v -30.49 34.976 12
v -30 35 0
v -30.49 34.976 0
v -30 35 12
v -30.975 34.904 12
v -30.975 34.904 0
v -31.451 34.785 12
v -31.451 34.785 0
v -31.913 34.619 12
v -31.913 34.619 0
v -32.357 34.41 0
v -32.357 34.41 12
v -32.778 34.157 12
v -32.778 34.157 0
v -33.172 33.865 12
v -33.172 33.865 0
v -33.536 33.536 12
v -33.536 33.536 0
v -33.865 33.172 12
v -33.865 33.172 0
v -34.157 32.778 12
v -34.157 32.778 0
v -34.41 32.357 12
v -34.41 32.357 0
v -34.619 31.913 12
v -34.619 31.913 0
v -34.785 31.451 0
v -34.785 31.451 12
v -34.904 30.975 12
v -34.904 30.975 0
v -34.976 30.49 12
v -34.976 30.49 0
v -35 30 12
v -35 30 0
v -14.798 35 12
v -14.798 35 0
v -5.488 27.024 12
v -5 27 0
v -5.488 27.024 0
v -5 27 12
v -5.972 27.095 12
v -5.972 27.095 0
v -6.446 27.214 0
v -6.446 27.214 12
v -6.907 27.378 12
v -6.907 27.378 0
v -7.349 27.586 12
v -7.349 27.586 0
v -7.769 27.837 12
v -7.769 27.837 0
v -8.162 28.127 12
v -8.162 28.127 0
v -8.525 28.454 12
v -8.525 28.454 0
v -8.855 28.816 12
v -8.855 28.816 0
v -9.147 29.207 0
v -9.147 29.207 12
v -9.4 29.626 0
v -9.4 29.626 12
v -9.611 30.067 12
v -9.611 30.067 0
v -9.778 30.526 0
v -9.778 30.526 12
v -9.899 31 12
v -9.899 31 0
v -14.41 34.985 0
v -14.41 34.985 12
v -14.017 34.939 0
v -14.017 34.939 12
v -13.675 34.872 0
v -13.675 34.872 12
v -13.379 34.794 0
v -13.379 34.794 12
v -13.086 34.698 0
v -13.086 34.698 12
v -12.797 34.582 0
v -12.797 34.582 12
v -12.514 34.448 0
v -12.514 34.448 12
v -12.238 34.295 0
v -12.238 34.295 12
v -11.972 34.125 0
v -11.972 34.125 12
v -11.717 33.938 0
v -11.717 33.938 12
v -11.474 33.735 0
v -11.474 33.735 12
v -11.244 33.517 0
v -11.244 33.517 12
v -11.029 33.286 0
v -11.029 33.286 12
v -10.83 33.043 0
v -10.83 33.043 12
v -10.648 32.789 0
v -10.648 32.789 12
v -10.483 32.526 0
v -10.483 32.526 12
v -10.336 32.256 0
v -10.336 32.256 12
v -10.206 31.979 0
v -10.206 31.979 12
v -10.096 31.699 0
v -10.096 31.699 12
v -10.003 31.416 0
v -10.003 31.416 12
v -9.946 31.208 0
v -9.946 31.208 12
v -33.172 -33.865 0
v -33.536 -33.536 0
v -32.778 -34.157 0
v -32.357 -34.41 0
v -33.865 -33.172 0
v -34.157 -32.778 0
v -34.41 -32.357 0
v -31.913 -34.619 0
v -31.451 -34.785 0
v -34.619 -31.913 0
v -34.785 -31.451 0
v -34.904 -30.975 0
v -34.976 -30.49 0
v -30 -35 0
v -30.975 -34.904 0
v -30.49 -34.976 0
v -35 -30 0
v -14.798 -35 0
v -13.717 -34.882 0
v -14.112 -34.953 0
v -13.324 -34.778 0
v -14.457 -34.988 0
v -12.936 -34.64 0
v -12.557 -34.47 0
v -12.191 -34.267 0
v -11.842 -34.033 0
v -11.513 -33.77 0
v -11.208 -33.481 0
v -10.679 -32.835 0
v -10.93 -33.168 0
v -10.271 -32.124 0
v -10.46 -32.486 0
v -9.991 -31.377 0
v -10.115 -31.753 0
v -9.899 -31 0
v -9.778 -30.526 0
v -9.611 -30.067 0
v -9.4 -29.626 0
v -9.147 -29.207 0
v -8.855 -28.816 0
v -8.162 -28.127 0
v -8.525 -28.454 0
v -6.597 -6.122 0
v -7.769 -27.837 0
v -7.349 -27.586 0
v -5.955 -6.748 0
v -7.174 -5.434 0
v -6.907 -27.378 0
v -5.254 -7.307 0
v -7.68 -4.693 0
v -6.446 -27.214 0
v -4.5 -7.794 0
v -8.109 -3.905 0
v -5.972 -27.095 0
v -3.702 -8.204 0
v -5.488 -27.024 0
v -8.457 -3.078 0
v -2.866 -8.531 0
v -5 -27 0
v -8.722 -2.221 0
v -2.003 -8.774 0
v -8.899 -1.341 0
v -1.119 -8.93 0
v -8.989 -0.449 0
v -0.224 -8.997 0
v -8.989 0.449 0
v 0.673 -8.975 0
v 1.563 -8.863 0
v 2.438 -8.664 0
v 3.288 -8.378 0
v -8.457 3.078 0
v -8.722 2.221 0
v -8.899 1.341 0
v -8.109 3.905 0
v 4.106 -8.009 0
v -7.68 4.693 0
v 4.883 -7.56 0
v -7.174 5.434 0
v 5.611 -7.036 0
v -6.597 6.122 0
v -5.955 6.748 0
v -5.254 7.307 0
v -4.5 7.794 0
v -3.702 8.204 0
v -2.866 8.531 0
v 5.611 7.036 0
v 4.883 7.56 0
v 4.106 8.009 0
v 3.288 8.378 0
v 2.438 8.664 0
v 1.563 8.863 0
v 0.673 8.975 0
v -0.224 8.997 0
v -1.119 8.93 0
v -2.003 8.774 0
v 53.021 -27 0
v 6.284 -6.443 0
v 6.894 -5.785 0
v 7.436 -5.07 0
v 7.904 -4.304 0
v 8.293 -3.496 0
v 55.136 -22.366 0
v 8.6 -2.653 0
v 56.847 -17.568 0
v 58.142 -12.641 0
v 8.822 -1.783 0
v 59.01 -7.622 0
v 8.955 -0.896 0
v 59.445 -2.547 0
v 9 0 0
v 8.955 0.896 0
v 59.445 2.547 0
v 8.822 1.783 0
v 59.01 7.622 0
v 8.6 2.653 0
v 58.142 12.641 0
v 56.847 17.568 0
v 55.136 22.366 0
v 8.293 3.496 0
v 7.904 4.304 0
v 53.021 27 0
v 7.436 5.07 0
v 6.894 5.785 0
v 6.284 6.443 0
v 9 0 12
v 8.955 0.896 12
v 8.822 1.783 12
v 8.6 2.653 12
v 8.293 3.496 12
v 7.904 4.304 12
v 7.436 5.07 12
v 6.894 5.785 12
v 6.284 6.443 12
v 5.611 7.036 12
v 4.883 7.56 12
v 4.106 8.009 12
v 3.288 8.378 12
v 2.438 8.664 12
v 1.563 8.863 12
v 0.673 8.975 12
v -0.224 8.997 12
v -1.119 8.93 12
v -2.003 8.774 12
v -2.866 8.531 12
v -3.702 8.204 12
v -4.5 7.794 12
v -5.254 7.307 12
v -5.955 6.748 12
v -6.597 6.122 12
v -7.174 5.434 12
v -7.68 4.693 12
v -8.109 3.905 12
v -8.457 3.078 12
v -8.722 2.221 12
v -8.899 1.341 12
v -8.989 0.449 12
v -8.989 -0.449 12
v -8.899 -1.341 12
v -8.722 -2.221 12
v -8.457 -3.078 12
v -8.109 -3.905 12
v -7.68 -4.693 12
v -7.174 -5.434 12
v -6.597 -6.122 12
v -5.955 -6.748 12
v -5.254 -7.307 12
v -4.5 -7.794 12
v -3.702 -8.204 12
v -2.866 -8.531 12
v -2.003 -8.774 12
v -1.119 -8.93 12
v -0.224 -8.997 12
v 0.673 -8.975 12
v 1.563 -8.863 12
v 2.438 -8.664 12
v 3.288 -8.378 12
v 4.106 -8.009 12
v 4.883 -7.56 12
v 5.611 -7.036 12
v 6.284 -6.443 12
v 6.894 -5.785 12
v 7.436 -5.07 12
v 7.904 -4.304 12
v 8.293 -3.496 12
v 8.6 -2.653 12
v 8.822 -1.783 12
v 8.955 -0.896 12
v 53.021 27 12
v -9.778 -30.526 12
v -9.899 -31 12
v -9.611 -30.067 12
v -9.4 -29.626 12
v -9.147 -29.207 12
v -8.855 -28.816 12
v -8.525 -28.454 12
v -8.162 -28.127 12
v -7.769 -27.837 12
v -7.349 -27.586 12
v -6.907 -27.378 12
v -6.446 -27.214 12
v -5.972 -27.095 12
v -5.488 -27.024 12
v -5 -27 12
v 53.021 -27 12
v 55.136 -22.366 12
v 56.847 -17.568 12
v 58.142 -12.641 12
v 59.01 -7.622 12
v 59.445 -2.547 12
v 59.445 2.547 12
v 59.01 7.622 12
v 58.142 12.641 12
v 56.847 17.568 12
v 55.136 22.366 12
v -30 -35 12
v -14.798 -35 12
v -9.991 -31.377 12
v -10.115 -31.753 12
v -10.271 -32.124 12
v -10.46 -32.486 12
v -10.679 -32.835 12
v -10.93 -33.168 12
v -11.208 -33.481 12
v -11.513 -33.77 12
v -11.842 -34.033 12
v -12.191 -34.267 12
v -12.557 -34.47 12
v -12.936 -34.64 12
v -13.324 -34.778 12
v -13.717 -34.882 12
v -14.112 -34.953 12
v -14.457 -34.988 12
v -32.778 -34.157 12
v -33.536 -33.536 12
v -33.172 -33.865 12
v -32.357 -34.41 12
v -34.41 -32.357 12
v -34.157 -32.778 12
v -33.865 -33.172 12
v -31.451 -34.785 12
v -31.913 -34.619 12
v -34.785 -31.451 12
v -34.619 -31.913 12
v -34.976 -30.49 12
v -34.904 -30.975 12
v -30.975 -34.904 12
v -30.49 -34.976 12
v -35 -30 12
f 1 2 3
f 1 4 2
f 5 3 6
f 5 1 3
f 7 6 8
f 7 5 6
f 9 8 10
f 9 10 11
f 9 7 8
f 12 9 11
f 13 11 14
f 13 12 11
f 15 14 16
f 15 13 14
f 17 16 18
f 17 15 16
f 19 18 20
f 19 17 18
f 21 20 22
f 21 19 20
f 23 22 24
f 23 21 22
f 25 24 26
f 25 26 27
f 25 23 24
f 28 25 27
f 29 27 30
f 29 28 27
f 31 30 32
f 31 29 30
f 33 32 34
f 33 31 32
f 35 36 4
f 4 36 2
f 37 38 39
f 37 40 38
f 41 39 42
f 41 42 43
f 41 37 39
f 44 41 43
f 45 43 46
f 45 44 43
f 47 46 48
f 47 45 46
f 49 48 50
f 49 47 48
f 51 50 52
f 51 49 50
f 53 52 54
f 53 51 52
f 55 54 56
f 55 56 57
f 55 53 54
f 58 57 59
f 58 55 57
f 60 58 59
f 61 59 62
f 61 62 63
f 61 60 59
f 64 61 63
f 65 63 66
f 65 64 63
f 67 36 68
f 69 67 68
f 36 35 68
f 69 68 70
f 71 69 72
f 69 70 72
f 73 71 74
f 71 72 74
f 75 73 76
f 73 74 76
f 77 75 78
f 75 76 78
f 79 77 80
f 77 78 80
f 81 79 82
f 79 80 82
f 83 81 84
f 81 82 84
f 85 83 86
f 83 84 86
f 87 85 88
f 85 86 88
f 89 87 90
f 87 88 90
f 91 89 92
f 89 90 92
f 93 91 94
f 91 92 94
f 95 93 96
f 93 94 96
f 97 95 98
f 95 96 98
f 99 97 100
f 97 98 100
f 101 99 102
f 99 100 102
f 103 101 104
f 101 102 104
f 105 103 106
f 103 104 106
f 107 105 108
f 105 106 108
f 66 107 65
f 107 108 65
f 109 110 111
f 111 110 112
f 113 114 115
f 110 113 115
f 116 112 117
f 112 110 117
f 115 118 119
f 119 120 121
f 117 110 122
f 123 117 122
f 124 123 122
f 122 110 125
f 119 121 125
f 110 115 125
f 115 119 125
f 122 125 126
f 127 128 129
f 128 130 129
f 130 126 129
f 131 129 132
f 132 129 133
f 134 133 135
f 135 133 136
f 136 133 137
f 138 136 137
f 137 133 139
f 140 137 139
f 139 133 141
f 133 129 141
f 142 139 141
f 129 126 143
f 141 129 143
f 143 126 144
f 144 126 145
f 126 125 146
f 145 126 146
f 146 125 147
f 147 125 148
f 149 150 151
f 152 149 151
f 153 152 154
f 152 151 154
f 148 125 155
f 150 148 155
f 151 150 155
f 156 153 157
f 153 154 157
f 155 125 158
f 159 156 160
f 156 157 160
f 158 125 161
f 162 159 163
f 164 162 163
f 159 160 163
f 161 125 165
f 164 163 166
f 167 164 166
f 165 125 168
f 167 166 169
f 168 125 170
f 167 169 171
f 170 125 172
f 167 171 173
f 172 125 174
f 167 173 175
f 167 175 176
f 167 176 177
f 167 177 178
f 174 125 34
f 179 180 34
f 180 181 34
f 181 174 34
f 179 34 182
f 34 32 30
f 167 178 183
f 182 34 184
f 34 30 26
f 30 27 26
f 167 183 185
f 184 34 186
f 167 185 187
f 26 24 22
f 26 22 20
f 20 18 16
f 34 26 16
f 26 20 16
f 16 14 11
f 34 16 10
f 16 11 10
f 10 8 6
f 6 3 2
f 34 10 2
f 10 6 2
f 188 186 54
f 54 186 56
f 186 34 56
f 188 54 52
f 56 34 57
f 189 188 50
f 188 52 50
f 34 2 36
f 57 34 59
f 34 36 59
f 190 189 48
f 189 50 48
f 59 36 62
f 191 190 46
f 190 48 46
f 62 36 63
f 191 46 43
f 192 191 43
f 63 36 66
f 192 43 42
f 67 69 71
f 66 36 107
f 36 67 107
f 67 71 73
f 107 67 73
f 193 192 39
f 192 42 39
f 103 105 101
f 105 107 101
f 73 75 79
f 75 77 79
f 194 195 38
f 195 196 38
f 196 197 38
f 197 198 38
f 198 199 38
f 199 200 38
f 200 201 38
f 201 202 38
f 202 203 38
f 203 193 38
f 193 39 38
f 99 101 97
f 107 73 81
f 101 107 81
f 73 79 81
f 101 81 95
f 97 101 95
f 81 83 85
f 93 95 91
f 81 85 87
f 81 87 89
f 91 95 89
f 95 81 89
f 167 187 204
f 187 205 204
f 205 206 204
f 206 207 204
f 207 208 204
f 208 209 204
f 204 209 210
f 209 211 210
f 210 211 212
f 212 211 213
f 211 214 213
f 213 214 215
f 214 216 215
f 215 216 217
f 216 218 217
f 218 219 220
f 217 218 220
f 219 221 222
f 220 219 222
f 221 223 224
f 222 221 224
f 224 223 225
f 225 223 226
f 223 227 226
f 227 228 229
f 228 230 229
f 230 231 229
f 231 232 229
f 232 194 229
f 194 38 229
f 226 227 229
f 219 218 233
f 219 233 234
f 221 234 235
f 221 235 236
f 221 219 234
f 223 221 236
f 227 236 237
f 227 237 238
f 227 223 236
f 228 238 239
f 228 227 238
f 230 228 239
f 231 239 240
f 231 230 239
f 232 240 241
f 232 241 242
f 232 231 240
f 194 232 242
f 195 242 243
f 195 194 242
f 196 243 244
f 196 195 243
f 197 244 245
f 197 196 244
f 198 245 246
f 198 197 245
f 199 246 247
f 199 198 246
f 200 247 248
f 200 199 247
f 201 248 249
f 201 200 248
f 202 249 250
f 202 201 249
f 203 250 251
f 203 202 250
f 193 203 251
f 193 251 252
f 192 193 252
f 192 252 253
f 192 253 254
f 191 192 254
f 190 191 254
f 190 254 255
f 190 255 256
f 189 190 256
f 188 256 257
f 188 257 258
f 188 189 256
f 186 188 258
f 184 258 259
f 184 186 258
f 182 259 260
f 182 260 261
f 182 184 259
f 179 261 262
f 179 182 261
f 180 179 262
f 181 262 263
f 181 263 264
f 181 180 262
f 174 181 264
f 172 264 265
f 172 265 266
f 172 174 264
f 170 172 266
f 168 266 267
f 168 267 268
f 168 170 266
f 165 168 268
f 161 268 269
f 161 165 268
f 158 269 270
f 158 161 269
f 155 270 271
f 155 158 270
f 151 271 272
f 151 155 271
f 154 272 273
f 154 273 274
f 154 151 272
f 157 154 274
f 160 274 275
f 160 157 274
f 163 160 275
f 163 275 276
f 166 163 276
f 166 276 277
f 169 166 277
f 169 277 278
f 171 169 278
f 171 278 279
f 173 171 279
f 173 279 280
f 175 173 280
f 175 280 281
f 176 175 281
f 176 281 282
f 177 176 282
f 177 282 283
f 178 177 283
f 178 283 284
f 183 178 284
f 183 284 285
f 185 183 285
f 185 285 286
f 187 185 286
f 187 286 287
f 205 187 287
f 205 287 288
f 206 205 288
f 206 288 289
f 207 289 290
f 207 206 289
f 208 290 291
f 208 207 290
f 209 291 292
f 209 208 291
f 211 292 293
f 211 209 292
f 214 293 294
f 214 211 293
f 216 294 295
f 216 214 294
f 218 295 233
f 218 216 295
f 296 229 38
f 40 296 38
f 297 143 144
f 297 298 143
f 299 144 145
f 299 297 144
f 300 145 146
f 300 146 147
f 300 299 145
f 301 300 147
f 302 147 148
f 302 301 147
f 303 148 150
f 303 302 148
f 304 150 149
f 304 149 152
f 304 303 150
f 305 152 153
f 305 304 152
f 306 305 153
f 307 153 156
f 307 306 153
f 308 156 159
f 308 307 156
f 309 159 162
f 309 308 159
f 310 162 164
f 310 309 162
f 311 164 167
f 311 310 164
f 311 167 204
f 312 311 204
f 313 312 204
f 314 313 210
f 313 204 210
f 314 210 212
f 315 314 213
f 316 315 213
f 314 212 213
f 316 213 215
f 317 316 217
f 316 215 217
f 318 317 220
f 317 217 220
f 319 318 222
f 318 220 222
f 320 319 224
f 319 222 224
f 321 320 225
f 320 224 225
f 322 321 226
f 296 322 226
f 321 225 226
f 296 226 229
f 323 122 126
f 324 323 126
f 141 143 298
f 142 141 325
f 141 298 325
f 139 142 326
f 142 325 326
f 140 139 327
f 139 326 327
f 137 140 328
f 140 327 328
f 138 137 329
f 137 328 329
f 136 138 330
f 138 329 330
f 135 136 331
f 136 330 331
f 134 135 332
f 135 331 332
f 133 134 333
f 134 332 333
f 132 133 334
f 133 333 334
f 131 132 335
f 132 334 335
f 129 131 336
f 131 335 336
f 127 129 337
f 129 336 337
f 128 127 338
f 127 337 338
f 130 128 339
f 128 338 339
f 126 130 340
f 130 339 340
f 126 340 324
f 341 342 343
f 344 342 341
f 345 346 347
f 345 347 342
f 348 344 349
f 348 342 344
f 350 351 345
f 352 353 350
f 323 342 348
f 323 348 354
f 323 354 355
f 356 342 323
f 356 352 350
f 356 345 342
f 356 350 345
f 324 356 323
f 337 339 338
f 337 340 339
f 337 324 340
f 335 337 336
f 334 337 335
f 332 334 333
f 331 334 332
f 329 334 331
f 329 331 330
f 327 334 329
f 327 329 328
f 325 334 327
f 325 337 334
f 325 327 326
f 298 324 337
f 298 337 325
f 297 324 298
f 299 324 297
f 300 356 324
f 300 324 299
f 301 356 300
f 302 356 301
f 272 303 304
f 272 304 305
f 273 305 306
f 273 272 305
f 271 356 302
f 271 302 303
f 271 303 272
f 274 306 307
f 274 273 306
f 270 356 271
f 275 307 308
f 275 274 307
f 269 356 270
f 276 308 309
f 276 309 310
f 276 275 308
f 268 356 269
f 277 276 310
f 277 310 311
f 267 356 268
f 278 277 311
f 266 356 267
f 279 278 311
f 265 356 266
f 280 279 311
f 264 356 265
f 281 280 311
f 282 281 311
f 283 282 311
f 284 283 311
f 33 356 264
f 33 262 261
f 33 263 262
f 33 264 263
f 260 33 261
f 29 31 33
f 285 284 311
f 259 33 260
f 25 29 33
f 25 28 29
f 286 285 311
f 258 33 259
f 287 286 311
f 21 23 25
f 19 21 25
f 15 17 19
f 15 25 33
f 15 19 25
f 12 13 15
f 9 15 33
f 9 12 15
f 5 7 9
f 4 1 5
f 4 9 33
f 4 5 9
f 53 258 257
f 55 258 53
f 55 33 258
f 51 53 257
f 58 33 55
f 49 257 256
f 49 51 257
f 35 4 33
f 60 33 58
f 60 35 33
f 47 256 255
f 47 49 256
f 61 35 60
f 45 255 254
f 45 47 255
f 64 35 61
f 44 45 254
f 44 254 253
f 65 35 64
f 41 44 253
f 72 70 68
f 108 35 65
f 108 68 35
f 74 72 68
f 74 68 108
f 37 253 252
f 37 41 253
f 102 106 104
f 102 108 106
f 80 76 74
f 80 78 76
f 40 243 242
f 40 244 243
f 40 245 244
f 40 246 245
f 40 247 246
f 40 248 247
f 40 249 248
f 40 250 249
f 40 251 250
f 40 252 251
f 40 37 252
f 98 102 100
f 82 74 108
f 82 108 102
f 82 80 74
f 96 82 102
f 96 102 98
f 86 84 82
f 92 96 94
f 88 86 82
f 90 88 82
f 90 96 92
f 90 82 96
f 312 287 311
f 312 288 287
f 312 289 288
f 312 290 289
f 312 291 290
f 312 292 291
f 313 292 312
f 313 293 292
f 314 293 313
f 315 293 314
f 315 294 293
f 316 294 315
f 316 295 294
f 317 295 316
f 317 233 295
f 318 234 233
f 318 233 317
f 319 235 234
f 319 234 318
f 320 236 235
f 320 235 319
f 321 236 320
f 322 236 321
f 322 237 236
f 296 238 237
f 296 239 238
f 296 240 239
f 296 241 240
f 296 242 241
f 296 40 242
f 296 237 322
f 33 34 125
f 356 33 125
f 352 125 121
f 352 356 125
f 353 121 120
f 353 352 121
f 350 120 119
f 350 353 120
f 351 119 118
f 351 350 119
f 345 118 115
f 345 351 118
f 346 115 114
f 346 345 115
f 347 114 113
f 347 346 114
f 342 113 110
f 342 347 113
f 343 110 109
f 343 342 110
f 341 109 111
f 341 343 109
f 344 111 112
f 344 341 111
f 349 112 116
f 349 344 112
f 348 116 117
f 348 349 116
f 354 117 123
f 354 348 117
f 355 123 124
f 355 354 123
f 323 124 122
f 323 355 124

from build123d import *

# Parameters (mm, degrees)
F0_R     = 9
F1_DEPTH = 12
F2_R     = 5
F3_R     = 5
F4_R     = 5
F5_R     = 5
F6_R     = 5


with BuildPart() as f1:
    # F0 (on Top) → F1 (new body)
    with BuildSketch(Plane.XY):
        with BuildLine():
            Line((-10, 35), (-35, 35))
            Line((-35, 35), (-35, -35))
            Line((-35, -35), (-10, -35))
            Line((-10, -35), (-10, -27))
            Line((-10, -27), (53.02122, -27))
            ThreePointArc((53.02122, -27), (59.499998, 0), (53.02122, 27))
            Line((53.02122, 27), (-10, 27))
            Line((-10, 27), (-10, 35))
        make_face()
        Circle(F0_R, mode=Mode.SUBTRACT)
    extrude(amount=F1_DEPTH)

    # F2
    f2_edges = [f1.edges().sort_by_distance(p)[0] for p in [
        (-10, -27, 6),
    ]]
    fillet(f2_edges, radius=F2_R)

    # F3
    f3_edges = [f1.edges().sort_by_distance(p)[0] for p in [
        (-10, 27, 6),
    ]]
    fillet(f3_edges, radius=F3_R)

    # F4
    f4_edges = [f1.edges().sort_by_distance(p)[0] for p in [
        (-10, -35, 6),
    ]]
    fillet(f4_edges, radius=F4_R)

    # F5
    f5_edges = [f1.edges().sort_by_distance(p)[0] for p in [
        (-10, 35, 6),
    ]]
    fillet(f5_edges, radius=F5_R)

    # F6
    f6_edges = [f1.edges().sort_by_distance(p)[0] for p in [
        (-35, -35, 6),
        (-35, 35, 6),
    ]]
    fillet(f6_edges, radius=F6_R)


solid = f1.part
